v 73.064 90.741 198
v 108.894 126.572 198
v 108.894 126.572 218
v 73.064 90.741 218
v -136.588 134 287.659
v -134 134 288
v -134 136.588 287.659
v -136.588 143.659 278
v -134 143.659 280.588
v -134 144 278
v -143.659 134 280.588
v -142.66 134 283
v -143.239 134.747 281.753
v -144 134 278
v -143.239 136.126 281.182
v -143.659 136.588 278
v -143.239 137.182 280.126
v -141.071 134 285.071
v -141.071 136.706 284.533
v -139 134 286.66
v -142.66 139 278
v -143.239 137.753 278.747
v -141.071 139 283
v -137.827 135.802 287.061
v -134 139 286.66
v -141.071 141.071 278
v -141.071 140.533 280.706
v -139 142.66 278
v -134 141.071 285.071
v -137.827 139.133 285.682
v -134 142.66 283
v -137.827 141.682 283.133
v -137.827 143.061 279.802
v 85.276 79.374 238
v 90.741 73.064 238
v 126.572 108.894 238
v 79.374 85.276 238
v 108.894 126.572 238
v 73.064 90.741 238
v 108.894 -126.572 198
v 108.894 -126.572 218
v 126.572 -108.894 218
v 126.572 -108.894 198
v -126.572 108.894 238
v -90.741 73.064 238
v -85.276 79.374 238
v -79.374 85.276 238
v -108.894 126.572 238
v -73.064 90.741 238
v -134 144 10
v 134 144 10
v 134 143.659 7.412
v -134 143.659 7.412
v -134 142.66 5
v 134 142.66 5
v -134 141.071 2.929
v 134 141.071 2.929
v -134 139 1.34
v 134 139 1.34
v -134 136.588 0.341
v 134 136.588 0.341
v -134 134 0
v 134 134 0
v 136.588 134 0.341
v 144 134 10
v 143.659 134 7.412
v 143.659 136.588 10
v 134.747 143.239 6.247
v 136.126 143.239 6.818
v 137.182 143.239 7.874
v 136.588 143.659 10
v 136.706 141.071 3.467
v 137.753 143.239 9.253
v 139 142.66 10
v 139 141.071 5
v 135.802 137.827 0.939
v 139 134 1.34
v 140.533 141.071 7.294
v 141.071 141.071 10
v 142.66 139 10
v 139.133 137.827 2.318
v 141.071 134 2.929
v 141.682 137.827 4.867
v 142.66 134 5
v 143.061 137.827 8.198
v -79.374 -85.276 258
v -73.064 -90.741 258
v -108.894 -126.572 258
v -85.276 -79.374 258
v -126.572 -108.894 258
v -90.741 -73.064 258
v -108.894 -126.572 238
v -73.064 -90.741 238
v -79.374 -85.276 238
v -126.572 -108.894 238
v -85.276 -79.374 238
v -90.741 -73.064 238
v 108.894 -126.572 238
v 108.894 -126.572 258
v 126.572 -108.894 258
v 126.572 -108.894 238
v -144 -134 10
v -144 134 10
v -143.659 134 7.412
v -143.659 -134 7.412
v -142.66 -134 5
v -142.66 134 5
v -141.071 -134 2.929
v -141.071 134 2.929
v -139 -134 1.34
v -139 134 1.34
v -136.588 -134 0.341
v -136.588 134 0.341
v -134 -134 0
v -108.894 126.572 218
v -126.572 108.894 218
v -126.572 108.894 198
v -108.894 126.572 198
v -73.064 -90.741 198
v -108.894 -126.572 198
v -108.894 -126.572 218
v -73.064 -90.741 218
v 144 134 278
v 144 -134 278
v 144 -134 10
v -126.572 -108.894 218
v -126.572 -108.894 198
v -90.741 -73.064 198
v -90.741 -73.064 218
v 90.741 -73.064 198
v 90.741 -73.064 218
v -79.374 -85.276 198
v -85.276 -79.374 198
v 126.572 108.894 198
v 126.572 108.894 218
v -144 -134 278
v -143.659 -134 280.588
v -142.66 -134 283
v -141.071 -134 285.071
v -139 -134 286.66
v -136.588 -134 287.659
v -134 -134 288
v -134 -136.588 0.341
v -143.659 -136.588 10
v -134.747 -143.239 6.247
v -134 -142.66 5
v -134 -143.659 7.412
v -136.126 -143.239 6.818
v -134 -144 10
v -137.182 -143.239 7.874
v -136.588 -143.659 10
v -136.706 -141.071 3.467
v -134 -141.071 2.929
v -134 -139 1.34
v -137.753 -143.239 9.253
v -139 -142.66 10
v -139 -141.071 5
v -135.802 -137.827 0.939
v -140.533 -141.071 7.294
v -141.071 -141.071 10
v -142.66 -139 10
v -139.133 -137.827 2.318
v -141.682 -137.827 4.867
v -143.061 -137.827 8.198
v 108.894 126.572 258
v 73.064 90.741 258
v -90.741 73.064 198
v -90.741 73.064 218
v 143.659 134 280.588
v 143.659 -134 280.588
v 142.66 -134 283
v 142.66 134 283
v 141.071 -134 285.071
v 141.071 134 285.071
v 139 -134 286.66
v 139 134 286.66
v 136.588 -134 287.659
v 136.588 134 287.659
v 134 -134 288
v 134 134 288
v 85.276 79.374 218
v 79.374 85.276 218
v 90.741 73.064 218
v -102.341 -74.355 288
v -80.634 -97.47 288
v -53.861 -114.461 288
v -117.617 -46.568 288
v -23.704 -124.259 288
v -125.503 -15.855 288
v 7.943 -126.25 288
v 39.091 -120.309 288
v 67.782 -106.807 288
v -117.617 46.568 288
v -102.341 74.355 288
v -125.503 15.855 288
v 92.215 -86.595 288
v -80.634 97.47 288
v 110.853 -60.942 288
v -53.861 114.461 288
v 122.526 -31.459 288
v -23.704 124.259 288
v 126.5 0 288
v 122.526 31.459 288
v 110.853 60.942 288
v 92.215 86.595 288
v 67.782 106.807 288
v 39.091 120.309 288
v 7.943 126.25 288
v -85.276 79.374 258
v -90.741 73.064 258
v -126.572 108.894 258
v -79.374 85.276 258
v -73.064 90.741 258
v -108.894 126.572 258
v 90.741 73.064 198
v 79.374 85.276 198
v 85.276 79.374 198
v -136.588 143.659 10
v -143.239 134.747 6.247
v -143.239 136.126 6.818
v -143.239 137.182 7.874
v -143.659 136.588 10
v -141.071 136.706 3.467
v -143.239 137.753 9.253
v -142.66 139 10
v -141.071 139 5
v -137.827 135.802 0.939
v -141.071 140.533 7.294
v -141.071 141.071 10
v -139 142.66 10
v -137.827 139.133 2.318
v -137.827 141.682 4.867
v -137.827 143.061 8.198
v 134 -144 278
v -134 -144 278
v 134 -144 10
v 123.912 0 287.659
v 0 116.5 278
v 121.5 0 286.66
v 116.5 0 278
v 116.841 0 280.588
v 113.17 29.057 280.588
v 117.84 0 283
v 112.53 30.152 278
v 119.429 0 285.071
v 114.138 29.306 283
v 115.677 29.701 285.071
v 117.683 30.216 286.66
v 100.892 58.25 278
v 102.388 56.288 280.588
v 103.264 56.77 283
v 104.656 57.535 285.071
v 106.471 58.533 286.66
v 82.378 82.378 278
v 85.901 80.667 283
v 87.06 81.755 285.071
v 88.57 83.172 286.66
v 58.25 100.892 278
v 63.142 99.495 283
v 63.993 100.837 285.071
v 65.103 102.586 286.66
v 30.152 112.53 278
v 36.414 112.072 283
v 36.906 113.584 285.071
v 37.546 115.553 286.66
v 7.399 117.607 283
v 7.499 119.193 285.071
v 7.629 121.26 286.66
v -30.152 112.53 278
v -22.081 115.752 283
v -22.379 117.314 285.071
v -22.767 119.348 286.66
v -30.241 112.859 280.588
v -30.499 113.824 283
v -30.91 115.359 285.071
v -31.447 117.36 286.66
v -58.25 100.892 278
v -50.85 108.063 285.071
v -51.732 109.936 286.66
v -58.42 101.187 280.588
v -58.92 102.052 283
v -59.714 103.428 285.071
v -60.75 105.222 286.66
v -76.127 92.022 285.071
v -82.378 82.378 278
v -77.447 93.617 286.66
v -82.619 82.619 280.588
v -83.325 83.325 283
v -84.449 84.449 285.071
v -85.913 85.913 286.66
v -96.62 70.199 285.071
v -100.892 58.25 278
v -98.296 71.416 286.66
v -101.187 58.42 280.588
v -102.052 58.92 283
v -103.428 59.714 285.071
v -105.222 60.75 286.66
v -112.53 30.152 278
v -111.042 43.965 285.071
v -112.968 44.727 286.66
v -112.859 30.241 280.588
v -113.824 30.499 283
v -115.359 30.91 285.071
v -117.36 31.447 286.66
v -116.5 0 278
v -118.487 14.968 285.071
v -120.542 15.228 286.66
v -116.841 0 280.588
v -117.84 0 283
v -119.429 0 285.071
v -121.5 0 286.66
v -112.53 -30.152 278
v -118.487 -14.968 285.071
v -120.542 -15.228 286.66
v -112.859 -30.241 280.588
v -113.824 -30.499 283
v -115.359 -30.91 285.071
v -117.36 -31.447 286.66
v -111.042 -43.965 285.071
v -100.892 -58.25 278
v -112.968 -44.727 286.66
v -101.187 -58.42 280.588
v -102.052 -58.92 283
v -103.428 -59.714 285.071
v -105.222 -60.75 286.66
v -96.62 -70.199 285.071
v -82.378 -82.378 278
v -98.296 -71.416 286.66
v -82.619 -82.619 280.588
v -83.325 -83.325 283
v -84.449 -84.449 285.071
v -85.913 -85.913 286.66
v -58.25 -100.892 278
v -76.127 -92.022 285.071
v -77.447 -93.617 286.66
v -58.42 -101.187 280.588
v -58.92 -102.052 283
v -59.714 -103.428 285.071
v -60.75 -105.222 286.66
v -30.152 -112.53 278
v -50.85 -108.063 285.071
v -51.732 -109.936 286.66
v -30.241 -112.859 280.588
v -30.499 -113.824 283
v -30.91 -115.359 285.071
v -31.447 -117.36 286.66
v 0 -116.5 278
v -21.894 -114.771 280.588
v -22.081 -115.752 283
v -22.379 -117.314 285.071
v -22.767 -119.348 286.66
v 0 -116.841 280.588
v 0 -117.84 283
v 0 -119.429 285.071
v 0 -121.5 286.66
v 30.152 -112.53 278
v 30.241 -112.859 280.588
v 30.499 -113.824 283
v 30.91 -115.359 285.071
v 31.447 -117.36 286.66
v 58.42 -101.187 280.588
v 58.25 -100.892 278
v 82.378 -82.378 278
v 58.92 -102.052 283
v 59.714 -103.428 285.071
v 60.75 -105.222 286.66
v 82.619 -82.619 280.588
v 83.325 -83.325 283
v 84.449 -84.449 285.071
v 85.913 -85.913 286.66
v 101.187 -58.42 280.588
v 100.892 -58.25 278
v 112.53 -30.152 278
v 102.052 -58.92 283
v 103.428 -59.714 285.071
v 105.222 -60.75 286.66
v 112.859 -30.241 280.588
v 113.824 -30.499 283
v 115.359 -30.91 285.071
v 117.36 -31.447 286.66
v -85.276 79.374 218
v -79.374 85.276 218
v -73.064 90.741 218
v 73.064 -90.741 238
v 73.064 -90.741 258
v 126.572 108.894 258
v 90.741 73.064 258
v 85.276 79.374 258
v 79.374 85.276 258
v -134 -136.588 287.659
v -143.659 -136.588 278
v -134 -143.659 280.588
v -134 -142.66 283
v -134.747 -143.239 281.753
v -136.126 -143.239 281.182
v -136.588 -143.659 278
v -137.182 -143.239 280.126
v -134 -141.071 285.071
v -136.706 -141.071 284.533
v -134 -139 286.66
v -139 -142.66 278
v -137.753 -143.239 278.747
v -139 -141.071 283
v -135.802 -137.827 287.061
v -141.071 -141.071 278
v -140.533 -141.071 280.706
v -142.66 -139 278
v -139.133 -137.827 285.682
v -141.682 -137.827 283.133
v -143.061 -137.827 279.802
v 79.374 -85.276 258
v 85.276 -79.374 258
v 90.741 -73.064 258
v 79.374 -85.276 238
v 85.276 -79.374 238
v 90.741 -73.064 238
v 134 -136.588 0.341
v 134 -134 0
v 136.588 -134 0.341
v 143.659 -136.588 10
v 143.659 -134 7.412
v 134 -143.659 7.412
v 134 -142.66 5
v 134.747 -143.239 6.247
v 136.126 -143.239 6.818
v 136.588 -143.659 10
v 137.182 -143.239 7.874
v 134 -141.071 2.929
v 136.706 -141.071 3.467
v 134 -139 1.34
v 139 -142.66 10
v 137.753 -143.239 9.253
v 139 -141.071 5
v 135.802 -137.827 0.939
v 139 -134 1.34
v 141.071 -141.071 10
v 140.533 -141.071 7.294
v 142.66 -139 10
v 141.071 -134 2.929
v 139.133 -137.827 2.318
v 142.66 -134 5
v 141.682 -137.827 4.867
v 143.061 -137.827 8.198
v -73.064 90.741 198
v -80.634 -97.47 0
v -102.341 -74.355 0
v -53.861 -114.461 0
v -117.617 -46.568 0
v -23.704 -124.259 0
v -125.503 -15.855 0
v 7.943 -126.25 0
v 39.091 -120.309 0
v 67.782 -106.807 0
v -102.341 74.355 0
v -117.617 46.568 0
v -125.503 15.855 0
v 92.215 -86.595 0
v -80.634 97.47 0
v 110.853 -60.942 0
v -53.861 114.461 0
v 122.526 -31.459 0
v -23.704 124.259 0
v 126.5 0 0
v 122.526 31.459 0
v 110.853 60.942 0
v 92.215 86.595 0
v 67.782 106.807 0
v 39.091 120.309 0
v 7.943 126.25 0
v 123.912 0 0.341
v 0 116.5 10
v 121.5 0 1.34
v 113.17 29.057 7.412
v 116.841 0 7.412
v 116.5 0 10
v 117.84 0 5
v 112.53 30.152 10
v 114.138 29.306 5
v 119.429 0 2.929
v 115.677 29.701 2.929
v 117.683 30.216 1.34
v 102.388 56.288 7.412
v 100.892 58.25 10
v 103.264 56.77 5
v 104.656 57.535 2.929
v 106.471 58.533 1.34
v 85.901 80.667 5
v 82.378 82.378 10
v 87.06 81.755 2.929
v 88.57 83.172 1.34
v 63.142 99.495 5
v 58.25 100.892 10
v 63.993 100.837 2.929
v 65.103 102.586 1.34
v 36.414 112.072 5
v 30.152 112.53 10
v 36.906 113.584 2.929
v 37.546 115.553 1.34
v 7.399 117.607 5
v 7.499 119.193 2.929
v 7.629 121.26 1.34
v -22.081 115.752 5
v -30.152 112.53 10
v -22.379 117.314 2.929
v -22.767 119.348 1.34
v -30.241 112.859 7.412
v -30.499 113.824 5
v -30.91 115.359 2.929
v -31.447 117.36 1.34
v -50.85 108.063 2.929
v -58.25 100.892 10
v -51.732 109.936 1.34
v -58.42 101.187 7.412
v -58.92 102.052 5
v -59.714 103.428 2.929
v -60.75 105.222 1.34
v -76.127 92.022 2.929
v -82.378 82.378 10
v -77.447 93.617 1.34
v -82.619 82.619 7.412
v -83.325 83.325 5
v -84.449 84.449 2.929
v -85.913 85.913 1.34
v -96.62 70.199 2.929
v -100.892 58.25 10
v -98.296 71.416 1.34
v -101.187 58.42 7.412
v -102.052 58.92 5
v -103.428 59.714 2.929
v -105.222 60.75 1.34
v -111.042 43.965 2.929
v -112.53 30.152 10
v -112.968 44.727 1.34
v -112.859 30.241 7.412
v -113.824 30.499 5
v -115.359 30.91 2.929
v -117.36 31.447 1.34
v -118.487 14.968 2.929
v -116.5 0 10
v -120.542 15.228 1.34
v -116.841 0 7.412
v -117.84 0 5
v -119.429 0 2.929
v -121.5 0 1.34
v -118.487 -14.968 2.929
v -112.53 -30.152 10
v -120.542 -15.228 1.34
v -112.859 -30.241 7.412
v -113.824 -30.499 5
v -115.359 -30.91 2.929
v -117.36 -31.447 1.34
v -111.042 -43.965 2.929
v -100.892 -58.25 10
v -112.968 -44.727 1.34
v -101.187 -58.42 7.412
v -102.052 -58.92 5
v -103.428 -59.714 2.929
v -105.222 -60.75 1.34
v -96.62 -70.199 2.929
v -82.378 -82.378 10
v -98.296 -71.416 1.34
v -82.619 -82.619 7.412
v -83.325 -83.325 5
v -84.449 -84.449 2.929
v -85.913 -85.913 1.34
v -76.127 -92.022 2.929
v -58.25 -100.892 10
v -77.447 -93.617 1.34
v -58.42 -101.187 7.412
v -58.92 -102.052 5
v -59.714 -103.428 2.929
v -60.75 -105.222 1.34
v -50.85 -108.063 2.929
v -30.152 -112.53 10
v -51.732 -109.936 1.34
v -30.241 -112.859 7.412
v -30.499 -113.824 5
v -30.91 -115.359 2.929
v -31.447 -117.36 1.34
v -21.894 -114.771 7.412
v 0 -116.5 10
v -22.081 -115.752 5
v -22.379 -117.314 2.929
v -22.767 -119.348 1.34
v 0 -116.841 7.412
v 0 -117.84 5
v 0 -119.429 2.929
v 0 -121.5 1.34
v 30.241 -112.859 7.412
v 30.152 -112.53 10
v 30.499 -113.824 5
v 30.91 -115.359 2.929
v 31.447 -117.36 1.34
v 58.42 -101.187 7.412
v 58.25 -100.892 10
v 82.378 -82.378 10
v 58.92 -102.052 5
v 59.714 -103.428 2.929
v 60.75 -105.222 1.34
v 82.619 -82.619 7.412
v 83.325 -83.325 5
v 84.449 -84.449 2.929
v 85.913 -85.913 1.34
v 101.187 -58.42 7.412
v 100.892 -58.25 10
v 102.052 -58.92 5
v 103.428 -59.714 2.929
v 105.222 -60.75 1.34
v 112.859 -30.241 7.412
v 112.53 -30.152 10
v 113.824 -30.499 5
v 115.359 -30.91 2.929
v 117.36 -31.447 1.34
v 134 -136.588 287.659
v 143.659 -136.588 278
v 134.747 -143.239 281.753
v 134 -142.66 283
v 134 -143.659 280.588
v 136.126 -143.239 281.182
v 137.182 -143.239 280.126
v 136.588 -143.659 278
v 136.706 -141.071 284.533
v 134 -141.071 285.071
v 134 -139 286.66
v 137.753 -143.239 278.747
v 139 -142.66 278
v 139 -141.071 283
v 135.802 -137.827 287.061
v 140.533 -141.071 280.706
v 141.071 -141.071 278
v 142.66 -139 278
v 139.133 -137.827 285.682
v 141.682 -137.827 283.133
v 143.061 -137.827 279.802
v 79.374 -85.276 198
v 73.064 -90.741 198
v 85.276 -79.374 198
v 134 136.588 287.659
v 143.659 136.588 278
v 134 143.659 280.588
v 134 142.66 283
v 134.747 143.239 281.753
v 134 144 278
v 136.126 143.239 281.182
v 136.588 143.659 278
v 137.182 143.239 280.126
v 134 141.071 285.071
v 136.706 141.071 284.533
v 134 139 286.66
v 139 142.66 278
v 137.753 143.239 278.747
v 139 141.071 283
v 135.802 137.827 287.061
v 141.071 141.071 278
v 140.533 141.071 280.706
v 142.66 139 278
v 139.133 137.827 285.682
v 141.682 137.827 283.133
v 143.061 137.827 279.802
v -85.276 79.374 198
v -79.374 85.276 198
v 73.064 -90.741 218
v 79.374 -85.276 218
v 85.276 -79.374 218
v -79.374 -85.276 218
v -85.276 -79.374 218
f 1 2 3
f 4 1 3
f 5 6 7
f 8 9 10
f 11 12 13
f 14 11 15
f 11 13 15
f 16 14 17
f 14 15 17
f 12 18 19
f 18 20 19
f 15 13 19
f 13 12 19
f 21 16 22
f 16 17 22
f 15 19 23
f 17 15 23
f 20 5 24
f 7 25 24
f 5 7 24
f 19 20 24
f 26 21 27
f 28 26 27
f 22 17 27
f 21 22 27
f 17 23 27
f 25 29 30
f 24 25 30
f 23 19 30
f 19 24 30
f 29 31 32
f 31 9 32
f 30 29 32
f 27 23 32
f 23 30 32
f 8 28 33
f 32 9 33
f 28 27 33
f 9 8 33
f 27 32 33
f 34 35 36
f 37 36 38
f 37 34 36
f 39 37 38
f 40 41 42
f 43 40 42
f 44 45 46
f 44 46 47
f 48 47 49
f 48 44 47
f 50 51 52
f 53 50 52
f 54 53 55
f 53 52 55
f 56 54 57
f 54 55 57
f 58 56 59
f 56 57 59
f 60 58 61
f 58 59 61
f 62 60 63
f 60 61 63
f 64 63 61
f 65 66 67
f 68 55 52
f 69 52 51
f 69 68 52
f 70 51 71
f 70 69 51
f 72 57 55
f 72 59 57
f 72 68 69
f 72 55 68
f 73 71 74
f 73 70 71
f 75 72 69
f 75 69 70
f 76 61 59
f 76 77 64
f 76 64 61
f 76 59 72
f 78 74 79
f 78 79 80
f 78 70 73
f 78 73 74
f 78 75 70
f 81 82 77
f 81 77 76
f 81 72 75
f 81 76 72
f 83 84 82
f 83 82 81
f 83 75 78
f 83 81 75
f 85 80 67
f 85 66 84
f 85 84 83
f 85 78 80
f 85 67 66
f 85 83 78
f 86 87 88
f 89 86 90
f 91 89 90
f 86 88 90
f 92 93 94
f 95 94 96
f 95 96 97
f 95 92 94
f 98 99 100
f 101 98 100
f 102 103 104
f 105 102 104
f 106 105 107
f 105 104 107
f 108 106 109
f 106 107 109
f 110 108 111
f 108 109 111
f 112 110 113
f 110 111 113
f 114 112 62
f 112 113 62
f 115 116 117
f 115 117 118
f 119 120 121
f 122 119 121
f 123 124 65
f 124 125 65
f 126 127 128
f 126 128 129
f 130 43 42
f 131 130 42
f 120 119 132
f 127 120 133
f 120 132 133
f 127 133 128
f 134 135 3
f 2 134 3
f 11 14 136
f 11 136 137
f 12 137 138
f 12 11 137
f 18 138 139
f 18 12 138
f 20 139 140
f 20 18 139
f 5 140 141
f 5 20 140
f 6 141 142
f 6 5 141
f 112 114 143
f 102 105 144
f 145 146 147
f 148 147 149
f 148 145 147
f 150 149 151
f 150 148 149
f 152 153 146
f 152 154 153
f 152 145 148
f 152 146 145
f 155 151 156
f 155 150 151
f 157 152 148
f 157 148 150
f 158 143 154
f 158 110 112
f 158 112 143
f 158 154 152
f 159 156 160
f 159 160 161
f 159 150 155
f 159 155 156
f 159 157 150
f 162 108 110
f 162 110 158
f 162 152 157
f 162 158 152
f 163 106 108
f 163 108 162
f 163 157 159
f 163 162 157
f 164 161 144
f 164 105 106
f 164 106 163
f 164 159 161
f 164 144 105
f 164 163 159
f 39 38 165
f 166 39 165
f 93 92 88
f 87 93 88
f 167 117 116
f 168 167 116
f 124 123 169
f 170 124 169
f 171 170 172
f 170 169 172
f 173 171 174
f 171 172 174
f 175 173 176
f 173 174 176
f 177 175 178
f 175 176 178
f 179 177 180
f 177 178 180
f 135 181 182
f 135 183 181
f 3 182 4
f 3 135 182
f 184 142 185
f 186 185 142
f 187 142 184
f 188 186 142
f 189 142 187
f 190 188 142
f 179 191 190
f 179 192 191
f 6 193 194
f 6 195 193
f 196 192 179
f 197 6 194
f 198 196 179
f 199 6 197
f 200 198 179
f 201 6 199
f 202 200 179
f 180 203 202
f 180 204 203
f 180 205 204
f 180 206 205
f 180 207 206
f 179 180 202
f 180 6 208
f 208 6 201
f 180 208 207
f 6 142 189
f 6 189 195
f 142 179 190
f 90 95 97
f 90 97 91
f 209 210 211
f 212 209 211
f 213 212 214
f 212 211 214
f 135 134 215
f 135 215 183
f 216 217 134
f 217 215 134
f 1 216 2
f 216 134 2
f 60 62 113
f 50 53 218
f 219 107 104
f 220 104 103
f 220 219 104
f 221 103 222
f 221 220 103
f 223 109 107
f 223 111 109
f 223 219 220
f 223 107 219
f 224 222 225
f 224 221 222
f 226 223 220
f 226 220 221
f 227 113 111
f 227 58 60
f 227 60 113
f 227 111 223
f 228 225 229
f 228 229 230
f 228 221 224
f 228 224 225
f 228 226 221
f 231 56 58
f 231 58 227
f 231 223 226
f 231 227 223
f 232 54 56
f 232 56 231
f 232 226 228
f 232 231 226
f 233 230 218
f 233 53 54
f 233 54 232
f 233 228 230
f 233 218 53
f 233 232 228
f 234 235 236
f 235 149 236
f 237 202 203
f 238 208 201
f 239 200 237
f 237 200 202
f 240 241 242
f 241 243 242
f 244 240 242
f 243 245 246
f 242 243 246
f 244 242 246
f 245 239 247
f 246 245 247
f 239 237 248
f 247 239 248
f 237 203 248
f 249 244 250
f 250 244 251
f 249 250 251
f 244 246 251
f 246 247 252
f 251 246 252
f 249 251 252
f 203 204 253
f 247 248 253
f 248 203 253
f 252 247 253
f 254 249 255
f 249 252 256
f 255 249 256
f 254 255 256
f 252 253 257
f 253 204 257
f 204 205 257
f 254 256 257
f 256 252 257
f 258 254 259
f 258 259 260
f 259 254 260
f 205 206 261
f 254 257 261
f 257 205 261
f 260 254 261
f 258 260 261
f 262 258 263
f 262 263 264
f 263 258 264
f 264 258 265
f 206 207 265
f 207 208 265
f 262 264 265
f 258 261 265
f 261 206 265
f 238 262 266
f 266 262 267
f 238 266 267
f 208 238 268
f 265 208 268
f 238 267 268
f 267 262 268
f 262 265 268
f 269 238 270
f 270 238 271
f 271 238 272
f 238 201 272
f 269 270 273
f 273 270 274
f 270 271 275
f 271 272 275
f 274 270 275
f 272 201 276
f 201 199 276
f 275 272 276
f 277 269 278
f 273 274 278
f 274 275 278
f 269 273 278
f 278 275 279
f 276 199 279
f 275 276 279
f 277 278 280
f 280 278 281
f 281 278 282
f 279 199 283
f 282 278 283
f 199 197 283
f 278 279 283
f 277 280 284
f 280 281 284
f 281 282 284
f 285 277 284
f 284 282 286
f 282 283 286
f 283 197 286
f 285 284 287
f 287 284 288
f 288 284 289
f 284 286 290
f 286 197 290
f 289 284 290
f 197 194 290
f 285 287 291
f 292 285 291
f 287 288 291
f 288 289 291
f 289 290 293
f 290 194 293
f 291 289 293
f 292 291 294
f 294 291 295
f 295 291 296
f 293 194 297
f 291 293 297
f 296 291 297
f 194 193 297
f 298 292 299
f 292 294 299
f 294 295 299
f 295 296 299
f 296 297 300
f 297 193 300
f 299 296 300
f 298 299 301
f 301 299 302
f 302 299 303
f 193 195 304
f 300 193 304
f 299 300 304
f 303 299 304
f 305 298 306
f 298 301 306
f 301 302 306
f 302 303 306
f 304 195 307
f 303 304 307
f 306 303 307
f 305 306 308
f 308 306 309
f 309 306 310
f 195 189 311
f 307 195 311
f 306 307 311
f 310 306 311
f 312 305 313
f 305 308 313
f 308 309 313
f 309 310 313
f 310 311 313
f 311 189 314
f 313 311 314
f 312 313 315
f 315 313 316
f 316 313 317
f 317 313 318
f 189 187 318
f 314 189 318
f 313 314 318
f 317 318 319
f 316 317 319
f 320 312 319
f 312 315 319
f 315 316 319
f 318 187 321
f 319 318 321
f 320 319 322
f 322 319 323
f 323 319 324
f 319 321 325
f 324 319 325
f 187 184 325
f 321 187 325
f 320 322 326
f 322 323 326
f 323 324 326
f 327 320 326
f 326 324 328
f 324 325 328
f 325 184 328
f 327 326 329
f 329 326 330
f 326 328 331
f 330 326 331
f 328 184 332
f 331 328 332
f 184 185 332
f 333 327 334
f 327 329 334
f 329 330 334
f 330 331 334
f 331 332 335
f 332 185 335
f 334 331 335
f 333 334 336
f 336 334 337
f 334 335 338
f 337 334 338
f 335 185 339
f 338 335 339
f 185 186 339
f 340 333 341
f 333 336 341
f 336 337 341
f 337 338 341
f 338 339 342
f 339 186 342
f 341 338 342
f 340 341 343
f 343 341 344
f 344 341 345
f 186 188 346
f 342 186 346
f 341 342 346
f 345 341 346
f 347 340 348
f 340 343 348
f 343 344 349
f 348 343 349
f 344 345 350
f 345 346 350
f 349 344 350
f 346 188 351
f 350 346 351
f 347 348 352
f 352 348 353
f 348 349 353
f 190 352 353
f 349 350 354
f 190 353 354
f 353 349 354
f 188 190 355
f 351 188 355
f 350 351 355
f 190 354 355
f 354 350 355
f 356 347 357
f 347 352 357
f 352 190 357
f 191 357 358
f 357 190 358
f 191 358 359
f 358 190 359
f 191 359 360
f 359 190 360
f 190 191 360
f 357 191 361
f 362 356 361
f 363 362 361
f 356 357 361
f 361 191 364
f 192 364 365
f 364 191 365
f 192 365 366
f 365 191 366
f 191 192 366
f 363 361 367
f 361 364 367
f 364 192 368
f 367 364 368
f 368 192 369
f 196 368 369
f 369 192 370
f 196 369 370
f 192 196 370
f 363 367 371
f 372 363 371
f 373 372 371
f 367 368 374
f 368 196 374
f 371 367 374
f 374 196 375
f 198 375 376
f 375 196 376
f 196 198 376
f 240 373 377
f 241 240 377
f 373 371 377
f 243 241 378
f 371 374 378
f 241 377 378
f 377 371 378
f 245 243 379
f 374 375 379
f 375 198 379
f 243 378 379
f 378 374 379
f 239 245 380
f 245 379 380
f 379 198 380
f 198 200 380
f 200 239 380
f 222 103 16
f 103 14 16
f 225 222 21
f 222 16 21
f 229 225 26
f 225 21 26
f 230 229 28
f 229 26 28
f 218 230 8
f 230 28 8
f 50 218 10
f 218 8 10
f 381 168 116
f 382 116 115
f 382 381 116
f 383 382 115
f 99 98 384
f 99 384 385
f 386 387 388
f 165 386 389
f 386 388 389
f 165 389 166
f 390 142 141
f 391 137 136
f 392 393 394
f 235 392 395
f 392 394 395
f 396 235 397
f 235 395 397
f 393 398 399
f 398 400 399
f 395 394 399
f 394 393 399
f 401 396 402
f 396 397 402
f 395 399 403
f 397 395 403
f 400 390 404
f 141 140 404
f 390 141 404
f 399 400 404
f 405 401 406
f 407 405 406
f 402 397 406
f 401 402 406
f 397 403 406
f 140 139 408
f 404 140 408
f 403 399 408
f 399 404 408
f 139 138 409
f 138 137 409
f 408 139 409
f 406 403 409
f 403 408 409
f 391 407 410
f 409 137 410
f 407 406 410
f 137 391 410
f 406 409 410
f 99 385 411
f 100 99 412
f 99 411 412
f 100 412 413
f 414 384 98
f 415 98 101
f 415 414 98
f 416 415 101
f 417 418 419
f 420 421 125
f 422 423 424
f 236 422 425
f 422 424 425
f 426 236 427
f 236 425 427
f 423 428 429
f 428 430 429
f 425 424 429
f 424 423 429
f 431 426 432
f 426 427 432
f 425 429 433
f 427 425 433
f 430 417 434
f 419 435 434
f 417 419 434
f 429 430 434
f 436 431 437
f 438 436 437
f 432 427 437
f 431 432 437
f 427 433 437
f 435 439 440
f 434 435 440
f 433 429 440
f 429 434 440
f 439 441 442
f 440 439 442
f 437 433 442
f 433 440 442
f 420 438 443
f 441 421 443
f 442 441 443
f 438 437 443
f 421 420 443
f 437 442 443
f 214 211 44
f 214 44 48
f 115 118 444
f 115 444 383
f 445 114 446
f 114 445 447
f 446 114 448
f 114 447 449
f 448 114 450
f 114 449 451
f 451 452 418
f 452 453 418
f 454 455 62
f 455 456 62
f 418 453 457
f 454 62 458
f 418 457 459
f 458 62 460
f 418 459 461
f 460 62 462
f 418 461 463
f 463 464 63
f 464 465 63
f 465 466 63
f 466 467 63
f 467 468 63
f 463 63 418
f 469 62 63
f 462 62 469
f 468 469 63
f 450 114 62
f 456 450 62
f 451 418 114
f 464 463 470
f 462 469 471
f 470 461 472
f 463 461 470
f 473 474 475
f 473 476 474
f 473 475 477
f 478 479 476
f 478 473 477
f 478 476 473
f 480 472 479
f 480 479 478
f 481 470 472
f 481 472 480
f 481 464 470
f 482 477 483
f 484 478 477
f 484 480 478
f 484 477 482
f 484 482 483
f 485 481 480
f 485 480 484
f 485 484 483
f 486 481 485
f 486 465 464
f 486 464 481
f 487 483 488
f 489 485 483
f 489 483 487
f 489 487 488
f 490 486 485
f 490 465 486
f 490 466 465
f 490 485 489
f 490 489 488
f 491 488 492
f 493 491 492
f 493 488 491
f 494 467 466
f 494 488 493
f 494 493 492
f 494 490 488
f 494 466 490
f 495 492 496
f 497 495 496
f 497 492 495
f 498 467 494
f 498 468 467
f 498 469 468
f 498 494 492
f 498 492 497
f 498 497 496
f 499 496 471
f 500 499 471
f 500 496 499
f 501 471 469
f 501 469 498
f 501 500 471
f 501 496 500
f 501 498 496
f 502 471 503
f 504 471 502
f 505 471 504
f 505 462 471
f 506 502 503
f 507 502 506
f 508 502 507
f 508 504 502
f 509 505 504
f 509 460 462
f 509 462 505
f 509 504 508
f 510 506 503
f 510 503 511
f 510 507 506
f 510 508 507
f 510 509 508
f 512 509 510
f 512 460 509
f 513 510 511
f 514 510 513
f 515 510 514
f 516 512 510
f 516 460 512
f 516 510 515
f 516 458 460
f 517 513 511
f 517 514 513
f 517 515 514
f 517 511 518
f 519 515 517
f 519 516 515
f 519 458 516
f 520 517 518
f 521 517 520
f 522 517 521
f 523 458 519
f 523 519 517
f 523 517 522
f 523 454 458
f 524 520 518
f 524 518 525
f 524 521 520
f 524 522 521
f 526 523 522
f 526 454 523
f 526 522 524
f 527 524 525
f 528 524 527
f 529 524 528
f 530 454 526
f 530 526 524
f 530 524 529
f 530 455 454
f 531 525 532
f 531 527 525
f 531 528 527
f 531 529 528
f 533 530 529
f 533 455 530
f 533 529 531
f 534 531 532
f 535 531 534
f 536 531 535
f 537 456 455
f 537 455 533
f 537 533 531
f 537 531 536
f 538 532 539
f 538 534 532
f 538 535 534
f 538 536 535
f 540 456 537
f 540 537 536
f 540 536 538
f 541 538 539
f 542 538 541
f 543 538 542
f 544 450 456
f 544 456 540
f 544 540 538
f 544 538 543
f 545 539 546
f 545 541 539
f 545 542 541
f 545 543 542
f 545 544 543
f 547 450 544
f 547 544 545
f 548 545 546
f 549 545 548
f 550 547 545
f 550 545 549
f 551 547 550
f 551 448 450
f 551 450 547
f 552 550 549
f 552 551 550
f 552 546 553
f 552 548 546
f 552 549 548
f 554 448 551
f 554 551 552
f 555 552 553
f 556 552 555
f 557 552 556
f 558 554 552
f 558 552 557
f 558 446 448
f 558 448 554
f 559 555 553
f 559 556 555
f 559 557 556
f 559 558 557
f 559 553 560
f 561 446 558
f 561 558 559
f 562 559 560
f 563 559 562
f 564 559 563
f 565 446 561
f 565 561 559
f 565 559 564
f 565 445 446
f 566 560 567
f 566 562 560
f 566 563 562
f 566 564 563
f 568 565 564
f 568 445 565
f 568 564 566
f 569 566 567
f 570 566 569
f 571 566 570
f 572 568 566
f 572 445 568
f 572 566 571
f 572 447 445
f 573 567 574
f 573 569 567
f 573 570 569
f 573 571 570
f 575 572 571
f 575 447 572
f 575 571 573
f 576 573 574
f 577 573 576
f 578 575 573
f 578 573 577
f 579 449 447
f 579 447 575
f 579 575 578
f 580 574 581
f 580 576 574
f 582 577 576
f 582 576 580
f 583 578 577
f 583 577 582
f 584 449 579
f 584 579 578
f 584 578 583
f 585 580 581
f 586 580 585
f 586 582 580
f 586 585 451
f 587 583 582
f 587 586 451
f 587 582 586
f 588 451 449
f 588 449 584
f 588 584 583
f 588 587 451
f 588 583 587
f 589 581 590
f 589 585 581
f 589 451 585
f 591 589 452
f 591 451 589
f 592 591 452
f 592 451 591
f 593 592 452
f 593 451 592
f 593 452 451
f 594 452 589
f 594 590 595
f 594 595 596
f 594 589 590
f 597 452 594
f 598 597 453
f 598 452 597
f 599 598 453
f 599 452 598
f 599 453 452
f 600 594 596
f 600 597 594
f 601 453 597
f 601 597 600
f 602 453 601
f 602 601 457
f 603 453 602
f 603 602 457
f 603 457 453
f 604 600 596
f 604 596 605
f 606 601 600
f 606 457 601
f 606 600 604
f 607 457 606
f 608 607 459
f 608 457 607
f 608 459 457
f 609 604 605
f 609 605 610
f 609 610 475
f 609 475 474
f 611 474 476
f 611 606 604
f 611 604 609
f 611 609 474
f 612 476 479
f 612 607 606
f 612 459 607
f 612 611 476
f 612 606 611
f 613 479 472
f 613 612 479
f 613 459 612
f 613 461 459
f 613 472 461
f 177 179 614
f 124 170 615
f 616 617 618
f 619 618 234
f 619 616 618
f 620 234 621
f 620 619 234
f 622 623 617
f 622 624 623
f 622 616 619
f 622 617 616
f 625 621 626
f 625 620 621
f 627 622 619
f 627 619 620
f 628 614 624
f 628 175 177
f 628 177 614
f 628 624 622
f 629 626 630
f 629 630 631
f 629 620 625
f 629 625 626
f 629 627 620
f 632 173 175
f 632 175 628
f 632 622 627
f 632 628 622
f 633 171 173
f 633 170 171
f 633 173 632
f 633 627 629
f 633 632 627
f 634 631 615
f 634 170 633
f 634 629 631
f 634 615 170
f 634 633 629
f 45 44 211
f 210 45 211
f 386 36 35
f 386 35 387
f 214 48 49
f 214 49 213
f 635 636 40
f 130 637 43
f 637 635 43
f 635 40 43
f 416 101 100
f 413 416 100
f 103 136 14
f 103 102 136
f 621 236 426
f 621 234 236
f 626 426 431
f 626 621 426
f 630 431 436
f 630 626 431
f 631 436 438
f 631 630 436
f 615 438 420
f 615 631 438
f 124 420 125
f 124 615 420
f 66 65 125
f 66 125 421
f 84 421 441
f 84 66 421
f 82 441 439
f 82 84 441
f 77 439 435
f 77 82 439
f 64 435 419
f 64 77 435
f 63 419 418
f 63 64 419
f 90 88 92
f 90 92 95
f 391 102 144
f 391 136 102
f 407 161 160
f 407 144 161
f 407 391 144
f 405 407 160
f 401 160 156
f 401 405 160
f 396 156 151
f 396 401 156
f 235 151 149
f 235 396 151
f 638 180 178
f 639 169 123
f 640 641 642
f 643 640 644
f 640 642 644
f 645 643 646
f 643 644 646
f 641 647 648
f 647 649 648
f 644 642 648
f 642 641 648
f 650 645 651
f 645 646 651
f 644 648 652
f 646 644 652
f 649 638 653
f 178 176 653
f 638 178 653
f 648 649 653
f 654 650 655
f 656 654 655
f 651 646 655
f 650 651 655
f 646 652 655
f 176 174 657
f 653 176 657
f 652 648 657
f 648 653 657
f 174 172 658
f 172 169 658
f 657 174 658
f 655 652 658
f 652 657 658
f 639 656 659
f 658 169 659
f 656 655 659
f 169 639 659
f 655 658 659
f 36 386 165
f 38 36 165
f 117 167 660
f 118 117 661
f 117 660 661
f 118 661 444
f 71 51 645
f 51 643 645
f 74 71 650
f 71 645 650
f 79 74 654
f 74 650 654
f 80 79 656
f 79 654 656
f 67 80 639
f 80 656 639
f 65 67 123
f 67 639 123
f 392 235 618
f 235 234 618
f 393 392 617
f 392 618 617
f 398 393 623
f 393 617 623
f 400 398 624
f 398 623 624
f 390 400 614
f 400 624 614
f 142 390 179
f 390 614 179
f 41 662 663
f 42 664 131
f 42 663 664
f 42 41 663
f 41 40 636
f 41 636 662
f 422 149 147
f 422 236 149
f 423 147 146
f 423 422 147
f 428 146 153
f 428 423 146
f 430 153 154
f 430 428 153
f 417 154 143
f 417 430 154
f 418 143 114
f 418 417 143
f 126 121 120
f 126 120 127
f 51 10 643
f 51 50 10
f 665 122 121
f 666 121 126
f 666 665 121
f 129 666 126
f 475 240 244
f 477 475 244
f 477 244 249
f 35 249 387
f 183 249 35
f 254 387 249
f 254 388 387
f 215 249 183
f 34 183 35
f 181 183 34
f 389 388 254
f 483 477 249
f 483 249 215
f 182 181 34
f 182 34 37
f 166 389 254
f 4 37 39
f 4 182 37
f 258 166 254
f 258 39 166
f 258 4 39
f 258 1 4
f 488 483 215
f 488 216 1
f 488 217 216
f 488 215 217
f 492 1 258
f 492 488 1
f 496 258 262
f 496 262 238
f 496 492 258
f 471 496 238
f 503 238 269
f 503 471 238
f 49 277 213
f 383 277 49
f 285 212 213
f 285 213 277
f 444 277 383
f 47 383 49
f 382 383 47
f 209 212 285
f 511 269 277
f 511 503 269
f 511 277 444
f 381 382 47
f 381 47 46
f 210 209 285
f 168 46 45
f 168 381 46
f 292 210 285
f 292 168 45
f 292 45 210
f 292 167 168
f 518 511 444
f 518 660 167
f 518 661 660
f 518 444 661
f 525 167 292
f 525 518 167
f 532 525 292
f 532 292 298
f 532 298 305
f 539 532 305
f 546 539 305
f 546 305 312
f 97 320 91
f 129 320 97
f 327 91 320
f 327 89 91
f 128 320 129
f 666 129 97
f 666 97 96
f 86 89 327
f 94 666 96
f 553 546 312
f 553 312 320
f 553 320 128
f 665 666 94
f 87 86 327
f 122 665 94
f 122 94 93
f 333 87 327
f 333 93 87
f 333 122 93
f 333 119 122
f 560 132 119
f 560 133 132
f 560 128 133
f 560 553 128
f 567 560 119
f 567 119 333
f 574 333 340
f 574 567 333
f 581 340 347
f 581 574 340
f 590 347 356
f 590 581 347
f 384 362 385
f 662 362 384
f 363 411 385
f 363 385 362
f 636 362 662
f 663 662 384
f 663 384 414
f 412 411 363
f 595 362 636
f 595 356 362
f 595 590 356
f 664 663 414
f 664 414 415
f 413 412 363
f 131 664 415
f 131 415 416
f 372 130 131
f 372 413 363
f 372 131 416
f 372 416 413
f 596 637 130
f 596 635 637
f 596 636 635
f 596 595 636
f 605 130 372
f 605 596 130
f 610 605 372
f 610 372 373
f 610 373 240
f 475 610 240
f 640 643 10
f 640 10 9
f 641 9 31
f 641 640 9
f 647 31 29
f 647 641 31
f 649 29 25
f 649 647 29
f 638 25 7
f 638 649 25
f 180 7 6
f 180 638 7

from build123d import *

# Parameters (mm, degrees)
F0_W     = 288
F0_H     = 288
F0_R     = 116.5
F1_DEPTH = 288
F2_R     = 10
F4_W     = 25
F4_H     = 20
F5_DEPTH = 166.5
F7_W     = 25
F7_H     = 20
F8_DEPTH = 166.5


with BuildPart() as f1:
    # F0 (on Top) → F1 (new body)
    with BuildSketch(Plane.XY):
        Rectangle(F0_W, F0_H)
        Circle(F0_R, mode=Mode.SUBTRACT)
    extrude(amount=F1_DEPTH)

    # F2
    f2_edges = [f1.edges().sort_by_distance(p)[0] for p in [
        (144, 0, 288),
        (0, 144, 288),
        (-144, 0, 288),
        (0, -144, 288),
        (-116.5, 0, 288),
        (144, 0, 0),
        (0, 144, 0),
        (-144, 0, 0),
        (0, -144, 0),
        (-116.5, 0, 0),
        (-144, 144, 144),
        (-144, -144, 144),
        (144, -144, 144),
        (144, 144, 144),
    ]]
    fillet(f2_edges, radius=F2_R)

    # F4 (on face) → F5 (cut, symmetric)
    with BuildSketch(Plane(origin=(0, 0, 0), x_dir=(-0.7071067812, 0.7071067812, 0), z_dir=(0.7071067812, 0.7071067812, 0))):
        with Locations((0, 248)):
            Rectangle(F4_W, F4_H)
        with Locations((0, 208)):
            Rectangle(F4_W, F4_H)
    extrude(amount=F5_DEPTH, both=True, mode=Mode.SUBTRACT)

    # F7 (on face) → F8 (cut, symmetric)
    with BuildSketch(Plane(origin=(0, 0, 0), x_dir=(0.7071067812, 0.7071067812, 0), z_dir=(0.7071067812, -0.7071067812, 0))):
        with Locations((0, 248)):
            Rectangle(F7_W, F7_H)
        with Locations((0, 208)):
            Rectangle(F7_W, F7_H)
    extrude(amount=F8_DEPTH, both=True, mode=Mode.SUBTRACT)


solid = f1.part
